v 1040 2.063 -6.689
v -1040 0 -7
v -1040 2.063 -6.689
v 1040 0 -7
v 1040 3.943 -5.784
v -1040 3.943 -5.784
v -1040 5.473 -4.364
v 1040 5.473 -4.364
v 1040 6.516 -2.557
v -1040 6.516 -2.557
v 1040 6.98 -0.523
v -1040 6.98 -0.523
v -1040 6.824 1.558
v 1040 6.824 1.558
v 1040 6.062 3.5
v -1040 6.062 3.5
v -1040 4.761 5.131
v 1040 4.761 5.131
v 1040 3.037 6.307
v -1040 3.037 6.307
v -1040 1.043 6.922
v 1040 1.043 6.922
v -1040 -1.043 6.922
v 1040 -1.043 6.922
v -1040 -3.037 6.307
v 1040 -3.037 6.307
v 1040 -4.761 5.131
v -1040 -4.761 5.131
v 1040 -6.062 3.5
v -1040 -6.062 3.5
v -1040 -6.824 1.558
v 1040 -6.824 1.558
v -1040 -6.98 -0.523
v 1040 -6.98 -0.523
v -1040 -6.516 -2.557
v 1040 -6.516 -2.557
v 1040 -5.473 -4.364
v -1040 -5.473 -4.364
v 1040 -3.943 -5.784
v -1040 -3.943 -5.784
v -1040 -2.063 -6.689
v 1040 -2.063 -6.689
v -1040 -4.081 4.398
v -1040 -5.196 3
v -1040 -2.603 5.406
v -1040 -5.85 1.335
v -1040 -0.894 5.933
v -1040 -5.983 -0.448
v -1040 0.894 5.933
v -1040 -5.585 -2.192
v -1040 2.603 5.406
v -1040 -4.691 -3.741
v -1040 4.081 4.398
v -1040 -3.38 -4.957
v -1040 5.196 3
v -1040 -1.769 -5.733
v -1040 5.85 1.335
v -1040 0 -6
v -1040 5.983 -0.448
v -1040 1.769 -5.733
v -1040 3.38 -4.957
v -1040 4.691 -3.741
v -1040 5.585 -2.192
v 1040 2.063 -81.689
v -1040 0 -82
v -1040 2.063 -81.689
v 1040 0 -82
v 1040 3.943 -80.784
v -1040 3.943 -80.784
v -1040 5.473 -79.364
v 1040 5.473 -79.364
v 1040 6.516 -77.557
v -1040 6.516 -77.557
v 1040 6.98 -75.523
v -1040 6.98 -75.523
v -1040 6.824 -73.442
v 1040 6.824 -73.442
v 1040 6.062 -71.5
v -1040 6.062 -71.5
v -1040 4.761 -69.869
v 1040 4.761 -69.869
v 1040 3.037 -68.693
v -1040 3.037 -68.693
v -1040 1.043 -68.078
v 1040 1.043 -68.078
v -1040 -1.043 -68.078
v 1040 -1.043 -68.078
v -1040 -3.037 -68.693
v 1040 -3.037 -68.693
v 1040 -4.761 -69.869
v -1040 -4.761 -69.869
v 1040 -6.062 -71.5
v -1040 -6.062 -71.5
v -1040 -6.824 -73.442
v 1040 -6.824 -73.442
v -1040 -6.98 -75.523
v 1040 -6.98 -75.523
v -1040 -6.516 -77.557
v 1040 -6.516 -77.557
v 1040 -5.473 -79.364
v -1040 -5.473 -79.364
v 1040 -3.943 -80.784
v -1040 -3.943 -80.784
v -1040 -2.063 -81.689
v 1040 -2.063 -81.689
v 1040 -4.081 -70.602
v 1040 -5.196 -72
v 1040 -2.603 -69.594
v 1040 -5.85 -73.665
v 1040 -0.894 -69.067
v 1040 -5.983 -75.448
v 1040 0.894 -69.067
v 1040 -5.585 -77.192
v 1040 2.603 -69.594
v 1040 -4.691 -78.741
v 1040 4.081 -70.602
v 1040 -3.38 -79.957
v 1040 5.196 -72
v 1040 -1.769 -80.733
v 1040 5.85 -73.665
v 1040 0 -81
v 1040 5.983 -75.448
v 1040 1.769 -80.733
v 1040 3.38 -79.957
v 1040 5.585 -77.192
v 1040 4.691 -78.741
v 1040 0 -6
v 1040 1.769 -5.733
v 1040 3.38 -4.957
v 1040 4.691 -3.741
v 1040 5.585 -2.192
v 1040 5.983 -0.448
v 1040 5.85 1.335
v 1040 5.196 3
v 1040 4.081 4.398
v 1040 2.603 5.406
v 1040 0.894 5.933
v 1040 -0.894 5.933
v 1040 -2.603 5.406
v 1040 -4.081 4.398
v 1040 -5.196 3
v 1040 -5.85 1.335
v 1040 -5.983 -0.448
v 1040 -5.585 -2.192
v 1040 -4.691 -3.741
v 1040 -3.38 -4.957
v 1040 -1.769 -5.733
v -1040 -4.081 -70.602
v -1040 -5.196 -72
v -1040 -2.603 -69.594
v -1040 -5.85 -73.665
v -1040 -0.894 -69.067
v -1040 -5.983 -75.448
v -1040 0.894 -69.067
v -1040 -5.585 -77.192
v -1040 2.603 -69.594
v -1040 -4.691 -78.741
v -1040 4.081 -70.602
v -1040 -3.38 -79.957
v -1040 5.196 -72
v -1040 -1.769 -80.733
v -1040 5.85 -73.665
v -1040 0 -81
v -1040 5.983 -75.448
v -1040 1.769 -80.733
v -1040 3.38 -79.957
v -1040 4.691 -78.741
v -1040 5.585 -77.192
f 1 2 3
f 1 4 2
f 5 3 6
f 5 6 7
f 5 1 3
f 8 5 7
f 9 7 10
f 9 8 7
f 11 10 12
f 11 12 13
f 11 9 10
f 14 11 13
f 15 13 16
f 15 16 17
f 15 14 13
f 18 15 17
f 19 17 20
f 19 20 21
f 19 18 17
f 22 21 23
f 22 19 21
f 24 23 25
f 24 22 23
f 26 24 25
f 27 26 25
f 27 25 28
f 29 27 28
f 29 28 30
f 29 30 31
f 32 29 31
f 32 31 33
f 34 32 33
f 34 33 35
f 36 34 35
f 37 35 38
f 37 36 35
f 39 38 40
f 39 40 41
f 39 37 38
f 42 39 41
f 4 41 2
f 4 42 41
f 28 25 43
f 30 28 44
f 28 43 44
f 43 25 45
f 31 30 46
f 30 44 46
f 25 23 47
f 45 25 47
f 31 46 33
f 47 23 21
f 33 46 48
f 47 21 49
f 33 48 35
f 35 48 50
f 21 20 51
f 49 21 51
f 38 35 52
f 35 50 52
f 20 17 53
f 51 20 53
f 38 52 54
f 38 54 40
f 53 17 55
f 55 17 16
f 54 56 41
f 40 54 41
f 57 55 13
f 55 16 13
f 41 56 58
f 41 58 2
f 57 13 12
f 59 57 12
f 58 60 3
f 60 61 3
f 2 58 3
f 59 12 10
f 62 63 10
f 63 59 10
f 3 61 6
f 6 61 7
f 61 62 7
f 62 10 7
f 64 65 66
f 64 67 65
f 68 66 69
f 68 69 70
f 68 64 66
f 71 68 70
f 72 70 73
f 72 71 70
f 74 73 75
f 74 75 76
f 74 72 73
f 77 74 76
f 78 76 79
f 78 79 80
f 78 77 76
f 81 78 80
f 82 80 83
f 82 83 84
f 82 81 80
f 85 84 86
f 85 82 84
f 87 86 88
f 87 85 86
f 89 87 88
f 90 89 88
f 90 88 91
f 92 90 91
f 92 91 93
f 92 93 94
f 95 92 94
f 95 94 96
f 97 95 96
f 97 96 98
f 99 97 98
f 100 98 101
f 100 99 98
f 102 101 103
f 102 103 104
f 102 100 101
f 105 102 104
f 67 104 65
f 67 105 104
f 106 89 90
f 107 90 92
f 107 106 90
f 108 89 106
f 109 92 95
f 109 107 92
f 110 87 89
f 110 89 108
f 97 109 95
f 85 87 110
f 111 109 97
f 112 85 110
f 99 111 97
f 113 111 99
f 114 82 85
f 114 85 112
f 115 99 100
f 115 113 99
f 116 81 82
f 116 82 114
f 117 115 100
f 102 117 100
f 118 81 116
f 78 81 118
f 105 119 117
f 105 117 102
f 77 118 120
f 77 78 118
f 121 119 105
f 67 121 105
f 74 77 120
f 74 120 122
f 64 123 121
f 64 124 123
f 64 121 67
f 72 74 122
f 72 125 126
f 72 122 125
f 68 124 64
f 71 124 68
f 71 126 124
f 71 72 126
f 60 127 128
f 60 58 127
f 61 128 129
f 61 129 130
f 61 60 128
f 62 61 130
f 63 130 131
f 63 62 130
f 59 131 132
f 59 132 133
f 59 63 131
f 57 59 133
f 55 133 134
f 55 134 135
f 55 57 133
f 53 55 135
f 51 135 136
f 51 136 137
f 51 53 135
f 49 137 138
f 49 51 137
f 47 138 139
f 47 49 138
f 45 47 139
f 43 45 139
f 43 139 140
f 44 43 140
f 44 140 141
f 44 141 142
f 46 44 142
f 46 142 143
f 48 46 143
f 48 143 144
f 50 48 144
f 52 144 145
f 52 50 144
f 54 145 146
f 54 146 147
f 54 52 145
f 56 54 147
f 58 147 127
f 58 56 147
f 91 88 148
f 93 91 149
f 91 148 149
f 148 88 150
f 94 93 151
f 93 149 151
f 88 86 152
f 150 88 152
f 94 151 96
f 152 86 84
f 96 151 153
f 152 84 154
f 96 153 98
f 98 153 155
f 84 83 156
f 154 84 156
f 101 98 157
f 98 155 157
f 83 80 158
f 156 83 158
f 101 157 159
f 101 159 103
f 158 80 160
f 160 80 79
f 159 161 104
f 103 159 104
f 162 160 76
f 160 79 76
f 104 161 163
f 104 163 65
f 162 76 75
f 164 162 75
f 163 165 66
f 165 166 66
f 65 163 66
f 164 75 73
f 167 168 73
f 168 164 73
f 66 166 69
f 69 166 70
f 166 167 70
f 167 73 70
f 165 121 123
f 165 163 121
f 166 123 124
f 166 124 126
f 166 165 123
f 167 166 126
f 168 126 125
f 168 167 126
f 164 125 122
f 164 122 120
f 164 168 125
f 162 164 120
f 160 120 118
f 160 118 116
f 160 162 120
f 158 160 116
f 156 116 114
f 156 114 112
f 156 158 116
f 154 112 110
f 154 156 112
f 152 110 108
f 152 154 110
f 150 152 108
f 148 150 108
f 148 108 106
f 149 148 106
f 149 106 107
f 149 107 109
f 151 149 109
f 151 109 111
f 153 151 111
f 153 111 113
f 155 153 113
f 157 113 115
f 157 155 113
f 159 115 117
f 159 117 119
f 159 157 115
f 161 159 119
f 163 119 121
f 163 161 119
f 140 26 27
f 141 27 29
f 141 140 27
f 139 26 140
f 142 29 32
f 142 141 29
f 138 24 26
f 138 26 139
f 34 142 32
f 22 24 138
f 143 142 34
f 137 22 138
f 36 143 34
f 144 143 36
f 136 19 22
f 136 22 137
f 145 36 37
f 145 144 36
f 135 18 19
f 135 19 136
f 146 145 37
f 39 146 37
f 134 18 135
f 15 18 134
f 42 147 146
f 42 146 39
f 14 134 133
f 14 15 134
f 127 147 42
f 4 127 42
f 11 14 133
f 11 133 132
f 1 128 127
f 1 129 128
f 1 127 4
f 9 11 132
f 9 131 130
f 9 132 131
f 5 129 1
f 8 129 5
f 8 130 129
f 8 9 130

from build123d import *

# Parameters (mm, degrees)
SKETCH2_R             = 7
SKETCH2_R_2           = 6
BOSS_EXTRUDE1_DEPTH   = 1040
BOSS_EXTRUDE1_2_DEPTH = 1040


with BuildPart() as part:
    # Sketch2 → Boss-Extrude1 (new, symmetric)
    with BuildSketch(Plane(origin=(0, 0, 0), x_dir=(0, 0, -1), z_dir=(1, 0, 0))):
        Circle(SKETCH2_R)
        Circle(SKETCH2_R_2, mode=Mode.SUBTRACT)
    extrude(amount=BOSS_EXTRUDE1_DEPTH, both=True)


with BuildPart() as body_2:
    # Sketch2 → Boss-Extrude1 2 (new, symmetric)
    with BuildSketch(Plane(origin=(0, 0, 0), x_dir=(0, 0, -1), z_dir=(1, 0, 0))):
        with Locations((75, 0)):
            Circle(SKETCH2_R)
        with Locations((75, 0)):
            Circle(SKETCH2_R_2, mode=Mode.SUBTRACT)
    extrude(amount=BOSS_EXTRUDE1_2_DEPTH, both=True)


solid = Compound([part.part, body_2.part])
